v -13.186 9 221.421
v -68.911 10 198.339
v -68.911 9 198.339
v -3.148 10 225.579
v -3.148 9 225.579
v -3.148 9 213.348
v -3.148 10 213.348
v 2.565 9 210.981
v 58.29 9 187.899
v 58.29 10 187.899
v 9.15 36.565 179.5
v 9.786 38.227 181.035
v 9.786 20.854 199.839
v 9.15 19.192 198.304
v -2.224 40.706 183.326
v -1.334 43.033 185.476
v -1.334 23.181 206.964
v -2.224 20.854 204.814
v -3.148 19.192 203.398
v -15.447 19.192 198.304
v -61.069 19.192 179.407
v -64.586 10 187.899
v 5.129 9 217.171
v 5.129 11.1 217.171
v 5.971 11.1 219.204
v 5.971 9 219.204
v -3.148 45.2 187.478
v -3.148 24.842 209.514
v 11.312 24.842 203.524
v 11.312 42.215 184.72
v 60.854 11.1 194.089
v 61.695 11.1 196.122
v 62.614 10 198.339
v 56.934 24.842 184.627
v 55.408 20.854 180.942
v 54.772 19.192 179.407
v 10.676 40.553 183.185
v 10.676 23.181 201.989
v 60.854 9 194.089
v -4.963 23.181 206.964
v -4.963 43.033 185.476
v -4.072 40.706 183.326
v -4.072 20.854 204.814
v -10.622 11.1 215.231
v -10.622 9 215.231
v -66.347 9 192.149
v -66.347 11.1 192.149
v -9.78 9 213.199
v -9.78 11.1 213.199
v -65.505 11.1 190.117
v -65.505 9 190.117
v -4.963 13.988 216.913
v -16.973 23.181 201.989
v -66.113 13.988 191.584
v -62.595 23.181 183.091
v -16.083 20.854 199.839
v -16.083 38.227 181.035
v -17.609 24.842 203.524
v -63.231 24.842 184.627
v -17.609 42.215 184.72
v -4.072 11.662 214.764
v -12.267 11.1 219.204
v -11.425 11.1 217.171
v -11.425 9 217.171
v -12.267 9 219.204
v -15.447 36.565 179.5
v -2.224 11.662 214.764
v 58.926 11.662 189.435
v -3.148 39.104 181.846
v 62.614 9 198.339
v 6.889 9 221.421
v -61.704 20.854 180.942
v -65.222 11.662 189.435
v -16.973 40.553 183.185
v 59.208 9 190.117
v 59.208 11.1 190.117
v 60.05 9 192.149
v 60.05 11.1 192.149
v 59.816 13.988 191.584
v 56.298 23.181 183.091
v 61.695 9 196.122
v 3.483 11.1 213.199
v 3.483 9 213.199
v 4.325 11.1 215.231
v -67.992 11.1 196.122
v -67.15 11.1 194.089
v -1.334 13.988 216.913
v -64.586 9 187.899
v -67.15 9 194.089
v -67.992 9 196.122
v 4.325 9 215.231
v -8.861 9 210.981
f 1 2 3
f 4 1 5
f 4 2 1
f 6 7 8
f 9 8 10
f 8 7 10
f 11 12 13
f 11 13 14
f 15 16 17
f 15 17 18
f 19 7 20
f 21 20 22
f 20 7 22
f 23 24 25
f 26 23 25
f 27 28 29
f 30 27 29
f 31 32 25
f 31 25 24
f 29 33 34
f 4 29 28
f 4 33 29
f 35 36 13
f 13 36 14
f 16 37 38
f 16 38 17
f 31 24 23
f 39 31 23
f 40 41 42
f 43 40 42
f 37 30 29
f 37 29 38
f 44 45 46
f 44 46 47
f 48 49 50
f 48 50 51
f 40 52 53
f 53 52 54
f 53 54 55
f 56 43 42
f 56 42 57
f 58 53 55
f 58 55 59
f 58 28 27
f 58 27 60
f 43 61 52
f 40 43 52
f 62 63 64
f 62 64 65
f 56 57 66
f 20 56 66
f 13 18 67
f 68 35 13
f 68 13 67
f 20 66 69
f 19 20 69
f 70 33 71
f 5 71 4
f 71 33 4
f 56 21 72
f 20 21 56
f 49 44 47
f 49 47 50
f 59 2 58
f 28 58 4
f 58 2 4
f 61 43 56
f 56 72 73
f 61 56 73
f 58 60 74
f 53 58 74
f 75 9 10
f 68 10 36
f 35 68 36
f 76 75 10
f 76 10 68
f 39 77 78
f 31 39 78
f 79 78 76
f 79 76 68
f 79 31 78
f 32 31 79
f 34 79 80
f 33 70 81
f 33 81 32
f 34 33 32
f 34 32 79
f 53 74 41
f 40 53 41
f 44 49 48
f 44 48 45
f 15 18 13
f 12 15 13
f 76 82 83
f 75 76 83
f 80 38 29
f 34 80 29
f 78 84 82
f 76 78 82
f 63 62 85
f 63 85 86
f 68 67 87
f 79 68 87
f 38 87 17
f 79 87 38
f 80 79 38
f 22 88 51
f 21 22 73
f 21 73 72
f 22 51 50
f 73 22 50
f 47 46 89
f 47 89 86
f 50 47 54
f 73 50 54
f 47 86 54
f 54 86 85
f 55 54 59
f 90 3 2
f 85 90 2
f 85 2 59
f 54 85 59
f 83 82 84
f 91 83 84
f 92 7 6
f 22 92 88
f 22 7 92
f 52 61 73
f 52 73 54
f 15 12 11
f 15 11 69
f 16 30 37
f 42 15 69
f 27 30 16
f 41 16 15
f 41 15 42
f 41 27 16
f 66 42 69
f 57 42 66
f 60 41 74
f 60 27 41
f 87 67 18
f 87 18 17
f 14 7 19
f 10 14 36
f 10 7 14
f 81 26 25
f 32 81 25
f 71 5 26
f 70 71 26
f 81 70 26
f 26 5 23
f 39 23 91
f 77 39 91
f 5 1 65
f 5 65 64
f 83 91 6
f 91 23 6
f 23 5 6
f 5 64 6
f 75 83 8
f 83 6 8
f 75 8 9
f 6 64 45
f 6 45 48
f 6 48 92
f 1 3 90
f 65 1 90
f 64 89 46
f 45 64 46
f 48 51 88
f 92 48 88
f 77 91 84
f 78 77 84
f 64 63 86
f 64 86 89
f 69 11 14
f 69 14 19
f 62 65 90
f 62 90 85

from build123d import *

# Parameters (mm, degrees)
SKETCH1_W                = 214.089522673
SKETCH1_H                = 271.033566845
BOSS_EXTRUDE1_DEPTH      = 10
SKETCH3_W                = 107.044761337
SKETCH3_H                = 271.033566845
CUT_EXTRUDE1_DEPTH       = 252.253590179
CUT_EXTRUDE2_DEPTH       = 249.55642867
BOSS_EXTRUDE3_DEPTH      = 40
CUT_EXTRUDE3_START       = -165.689856025
CUT_EXTRUDE3_DEPTH       = 205.862728092
CUT_EXTRUDE4_DEPTH       = 250.960593361
CUT_EXTRUDE5_DEPTH       = 250.960593361
BOSS_EXTRUDE5_DEPTH      = 45
CUT_EXTRUDE7_DEPTH       = 253.784190336
CUT_EXTRUDE9_DEPTH       = 253.784190336
CUT_EXTRUDE10_DEPTH      = 105
BOSS_EXTRUDE6_DEPTH      = 13.546139965
BOSS_EXTRUDE7_DEPTH      = 30
CUT_EXTRUDE12_DEPTH      = 30
SKETCH30_W               = 11.3
SKETCH30_H               = 54
CUT_EXTRUDE13_DEPTH      = 30
CUT_EXTRUDE14_DEPTH      = 30
CUT_EXTRUDE14_DEPTH_BACK = 101.665148292
SKETCH31_W               = 44.683801498
SKETCH31_H               = 21.311404518


with BuildPart() as part:
    # Sketch1 → Boss-Extrude1 (new body)
    with BuildSketch(Plane(origin=(0, 0, 0), x_dir=(1, 0, 0), z_dir=(0, 1, 0))):
        with Locations((-3.148375333, -90.062114546)):
            Rectangle(SKETCH1_W, SKETCH1_H)
    extrude(amount=BOSS_EXTRUDE1_DEPTH)

    # Sketch3 → Cut-Extrude1 (cut, through all)
    with BuildSketch(Plane(origin=(0, 10, 0), x_dir=(1, 0, 0), z_dir=(0, 1, 0))):
        with Locations((-56.670756002, -90.062114546)):
            Rectangle(SKETCH3_W, SKETCH3_H)
    extrude(amount=-CUT_EXTRUDE1_DEPTH, mode=Mode.SUBTRACT)

    # Sketch4 → Cut-Extrude2 (cut, through all)
    with BuildSketch(Plane(origin=(0, 10, 0), x_dir=(1, 0, 0), z_dir=(0, 1, 0))):
        Polygon((103.896386003, -181.239506042), (100.834918545, -173.848469781), (9.996584241, 45.454668877), (103.896386003, 45.454668877), align=None)
    extrude(amount=-CUT_EXTRUDE2_DEPTH, mode=Mode.SUBTRACT)

    # Sketch6 → Boss-Extrude3 (add, along a direction that is not the sketch's normal)
    with BuildSketch(Plane(origin=(0, 10, 0), x_dir=(1, 0, 0), z_dir=(0, 1, 0))):
        Polygon((99.572063218, -170.799667324), (103.896386003, -181.239506042), (-3.148375333, -225.578897968), (-3.148375333, -213.347866105), align=None)
    extrude(amount=BOSS_EXTRUDE3_DEPTH, dir=(-0.2705980500730979, 0.7071067811865489, -0.6532814824381872))

    # Cut-Extrude3: read off the stored shape, not the designer's step
    # Cut-Extrude3 outline → Cut-Extrude3 (cut)
    with BuildSketch(Plane(origin=(0, 0, 0), x_dir=(1, 0, 0), z_dir=(0, 0.6785983445458481, -0.7345095552677544)).offset(CUT_EXTRUDE3_START)):
        Polygon((-3.148375333, -165), (-3.148375333, -152.122604304), (-13.972297336, -155.165042499), (-15, -155.45391393), (-15, -165), align=None)
    extrude(amount=CUT_EXTRUDE3_DEPTH, mode=Mode.SUBTRACT)

    # Sketch8 → Cut-Extrude4 (cut, through all)
    with BuildSketch(Plane(origin=(0, 10, 0), x_dir=(1, 0, 0), z_dir=(0, 1, 0))):
        Polygon((-3.148375333, -225.578897968), (103.896386003, -181.239506042), (103.896386003, -225.578897968), align=None)
    extrude(amount=-CUT_EXTRUDE4_DEPTH, mode=Mode.SUBTRACT)

    # Sketch9 → Cut-Extrude5 (cut, through all)
    with BuildSketch(Plane(origin=(0, 10, 0), x_dir=(1, 0, 0), z_dir=(0, 1, 0))):
        Polygon((-3.148375333, -213.347866105), (99.572063218, -170.799667324), (9.996584241, 45.454668877), (-3.148375333, 45.454668877), align=None)
    extrude(amount=-CUT_EXTRUDE5_DEPTH, mode=Mode.SUBTRACT)

    # Sketch13 → Boss-Extrude5 (add)
    with BuildSketch(Plane.XZ):
        Polygon((-3.148375333, 225.578897968), (-3.148375333, 213.347866105), (99.572063218, 170.799667324), (103.896386003, 181.239506042), align=None)
    extrude(amount=BOSS_EXTRUDE5_DEPTH)

    # Sketch14 → Cut-Extrude7 (cut, through all)
    with BuildSketch(Plane(origin=(24.603270673, 0, -10.191008392), x_dir=(-0.38268343236508967, 0, -0.9238795325112868), z_dir=(0.9238795325112867, 0, -0.3826834323650896))):
        Polygon((-178.918624473, 38.284271247), (-173.268624473, 32.634271247), (-167.618624473, 38.284271247), align=None)
    extrude(amount=-CUT_EXTRUDE7_DEPTH, mode=Mode.SUBTRACT)

    # Sketch21 → Cut-Extrude9 (cut, through all)
    with BuildSketch(Plane(origin=(24.603270673, 0, -10.191008392), x_dir=(-0.38268343236508967, 0, -0.9238795325112868), z_dir=(0.9238795325112867, 0, -0.3826834323650896))):
        Polygon((-178.918624473, 38.284271247), (-173.268624473, 32.634271247), (-186.710507565, 19.192388155), (-188.372208501, 20.854089091), (-197.564596656, 11.661700936), (-199.891194785, 13.988299064), (-190.698806629, 23.18068722), (-192.360507565, 24.842388155), align=None)
    extrude(amount=-CUT_EXTRUDE9_DEPTH, mode=Mode.SUBTRACT)

    # Sketch26 → Cut-Extrude10 (cut)
    with BuildSketch(Plane(origin=(24.603270673, 0, -10.191008392), x_dir=(-0.38268343236508967, 0, -0.9238795325112868), z_dir=(0.9238795325112867, 0, -0.3826834323650896))):
        Polygon((-195.90289572, 9), (-195.90289572, -45), (-207.20289572, -45), (-207.20289572, 9), (-204.80289572, 9), (-204.80289572, 11.1), (-202.60289572, 11.1), (-202.60289572, 9), (-200.50289572, 9), (-200.50289572, 11.1), (-198.30289572, 11.1), (-198.30289572, 9), align=None)
    extrude(amount=-CUT_EXTRUDE10_DEPTH, mode=Mode.SUBTRACT)

    # Sketch27 → Boss-Extrude6 (add, along a direction that is not the sketch's normal)
    with BuildSketch(Plane(origin=(35.57097911, -92.95144786, 85.875940195), x_dir=(0.9626924198811571, 0.19875685341551327, -0.18362738881693624), z_dir=(-0.2705980500730966, 0.7071067811865525, -0.6532814824381838))):
        Polygon((-40.219860097, -165.940754997), (-39.260177115, -165.659670359), (-38.335322468, -168.817321636), (-40.219860097, -169.369289928), align=None)
    extrude(amount=BOSS_EXTRUDE6_DEPTH, dir=(0, 0.6785983445458494, -0.7345095552677533))

    # Sketch28 → Boss-Extrude7 (add, along a direction that is not the sketch's normal)
    with BuildSketch(Plane(origin=(32.053204459, -83.759059705, 77.383280924), x_dir=(0.9626924198811573, 0.1987568534155131, -0.18362738881693524), z_dir=(-0.27059805007309584, 0.7071067811865541, -0.6532814824381823))):
        Polygon((-23.130198055, -160.935308873), (-23.790746954, -158.680053865), (-36.565759807, -162.4217685), (-36.565759807, -170.747754034), (-21.54479451, -166.348215158), (-22.205343409, -164.09296015), (-34.681222178, -167.74706044), (-35.606076824, -164.589409163), align=None)
    extrude(amount=BOSS_EXTRUDE7_DEPTH, dir=(0, 0.6785983445458483, -0.7345095552677544))

    # Sketch29 → Cut-Extrude12 (cut)
    with BuildSketch(Plane(origin=(41.559974827, 108.60144786, 100.334654879), x_dir=(0.9626924198811563, -0.1987568534155138, -0.18362738881693985), z_dir=(0.2705980500730995, 0.7071067811865461, 0.6532814824381895))):
        Polygon((-46.440949609, -107.03174708), (-31.419984312, -107.03174708), (-31.419984312, -102.632208204), align=None)
    extrude(amount=-CUT_EXTRUDE12_DEPTH, mode=Mode.SUBTRACT)

    # Sketch30 → Cut-Extrude13 (cut)
    with BuildSketch(Plane(origin=(-72.40408024, 0, 29.990752007), x_dir=(-0.3826834323650857, 0, -0.9238795325112884), z_dir=(0.9238795325112884, 0, -0.3826834323650857))):
        with Locations((-201.55289572, -18)):
            Rectangle(SKETCH30_W, SKETCH30_H)
    extrude(amount=-CUT_EXTRUDE13_DEPTH, mode=Mode.SUBTRACT)

    # Sketch31 → Cut-Extrude14 (cut, two sides: drawn at the far end of the back side and taken through both)
    with BuildSketch(Plane(origin=(74.968792545, 0, 180.990675716), x_dir=(-0.9238795325112865, 0, 0.38268343236509056), z_dir=(-0.38268343236509056, 0, -0.9238795325112865)).offset(-CUT_EXTRUDE14_DEPTH_BACK)):
        with Locations((-4.288487529, 19.655702259)):
            Rectangle(SKETCH31_W, SKETCH31_H)
    extrude(amount=CUT_EXTRUDE14_DEPTH + CUT_EXTRUDE14_DEPTH_BACK, mode=Mode.SUBTRACT)

    # Mirror4: part across plane


with BuildPart() as part_1:
    add(part.part)
    add(part.part.mirror(Plane(origin=(-3.148375333, 0, 225.578897968), x_dir=(0, 0, 1), z_dir=(1, 0, 0))))


solid = part_1.part
